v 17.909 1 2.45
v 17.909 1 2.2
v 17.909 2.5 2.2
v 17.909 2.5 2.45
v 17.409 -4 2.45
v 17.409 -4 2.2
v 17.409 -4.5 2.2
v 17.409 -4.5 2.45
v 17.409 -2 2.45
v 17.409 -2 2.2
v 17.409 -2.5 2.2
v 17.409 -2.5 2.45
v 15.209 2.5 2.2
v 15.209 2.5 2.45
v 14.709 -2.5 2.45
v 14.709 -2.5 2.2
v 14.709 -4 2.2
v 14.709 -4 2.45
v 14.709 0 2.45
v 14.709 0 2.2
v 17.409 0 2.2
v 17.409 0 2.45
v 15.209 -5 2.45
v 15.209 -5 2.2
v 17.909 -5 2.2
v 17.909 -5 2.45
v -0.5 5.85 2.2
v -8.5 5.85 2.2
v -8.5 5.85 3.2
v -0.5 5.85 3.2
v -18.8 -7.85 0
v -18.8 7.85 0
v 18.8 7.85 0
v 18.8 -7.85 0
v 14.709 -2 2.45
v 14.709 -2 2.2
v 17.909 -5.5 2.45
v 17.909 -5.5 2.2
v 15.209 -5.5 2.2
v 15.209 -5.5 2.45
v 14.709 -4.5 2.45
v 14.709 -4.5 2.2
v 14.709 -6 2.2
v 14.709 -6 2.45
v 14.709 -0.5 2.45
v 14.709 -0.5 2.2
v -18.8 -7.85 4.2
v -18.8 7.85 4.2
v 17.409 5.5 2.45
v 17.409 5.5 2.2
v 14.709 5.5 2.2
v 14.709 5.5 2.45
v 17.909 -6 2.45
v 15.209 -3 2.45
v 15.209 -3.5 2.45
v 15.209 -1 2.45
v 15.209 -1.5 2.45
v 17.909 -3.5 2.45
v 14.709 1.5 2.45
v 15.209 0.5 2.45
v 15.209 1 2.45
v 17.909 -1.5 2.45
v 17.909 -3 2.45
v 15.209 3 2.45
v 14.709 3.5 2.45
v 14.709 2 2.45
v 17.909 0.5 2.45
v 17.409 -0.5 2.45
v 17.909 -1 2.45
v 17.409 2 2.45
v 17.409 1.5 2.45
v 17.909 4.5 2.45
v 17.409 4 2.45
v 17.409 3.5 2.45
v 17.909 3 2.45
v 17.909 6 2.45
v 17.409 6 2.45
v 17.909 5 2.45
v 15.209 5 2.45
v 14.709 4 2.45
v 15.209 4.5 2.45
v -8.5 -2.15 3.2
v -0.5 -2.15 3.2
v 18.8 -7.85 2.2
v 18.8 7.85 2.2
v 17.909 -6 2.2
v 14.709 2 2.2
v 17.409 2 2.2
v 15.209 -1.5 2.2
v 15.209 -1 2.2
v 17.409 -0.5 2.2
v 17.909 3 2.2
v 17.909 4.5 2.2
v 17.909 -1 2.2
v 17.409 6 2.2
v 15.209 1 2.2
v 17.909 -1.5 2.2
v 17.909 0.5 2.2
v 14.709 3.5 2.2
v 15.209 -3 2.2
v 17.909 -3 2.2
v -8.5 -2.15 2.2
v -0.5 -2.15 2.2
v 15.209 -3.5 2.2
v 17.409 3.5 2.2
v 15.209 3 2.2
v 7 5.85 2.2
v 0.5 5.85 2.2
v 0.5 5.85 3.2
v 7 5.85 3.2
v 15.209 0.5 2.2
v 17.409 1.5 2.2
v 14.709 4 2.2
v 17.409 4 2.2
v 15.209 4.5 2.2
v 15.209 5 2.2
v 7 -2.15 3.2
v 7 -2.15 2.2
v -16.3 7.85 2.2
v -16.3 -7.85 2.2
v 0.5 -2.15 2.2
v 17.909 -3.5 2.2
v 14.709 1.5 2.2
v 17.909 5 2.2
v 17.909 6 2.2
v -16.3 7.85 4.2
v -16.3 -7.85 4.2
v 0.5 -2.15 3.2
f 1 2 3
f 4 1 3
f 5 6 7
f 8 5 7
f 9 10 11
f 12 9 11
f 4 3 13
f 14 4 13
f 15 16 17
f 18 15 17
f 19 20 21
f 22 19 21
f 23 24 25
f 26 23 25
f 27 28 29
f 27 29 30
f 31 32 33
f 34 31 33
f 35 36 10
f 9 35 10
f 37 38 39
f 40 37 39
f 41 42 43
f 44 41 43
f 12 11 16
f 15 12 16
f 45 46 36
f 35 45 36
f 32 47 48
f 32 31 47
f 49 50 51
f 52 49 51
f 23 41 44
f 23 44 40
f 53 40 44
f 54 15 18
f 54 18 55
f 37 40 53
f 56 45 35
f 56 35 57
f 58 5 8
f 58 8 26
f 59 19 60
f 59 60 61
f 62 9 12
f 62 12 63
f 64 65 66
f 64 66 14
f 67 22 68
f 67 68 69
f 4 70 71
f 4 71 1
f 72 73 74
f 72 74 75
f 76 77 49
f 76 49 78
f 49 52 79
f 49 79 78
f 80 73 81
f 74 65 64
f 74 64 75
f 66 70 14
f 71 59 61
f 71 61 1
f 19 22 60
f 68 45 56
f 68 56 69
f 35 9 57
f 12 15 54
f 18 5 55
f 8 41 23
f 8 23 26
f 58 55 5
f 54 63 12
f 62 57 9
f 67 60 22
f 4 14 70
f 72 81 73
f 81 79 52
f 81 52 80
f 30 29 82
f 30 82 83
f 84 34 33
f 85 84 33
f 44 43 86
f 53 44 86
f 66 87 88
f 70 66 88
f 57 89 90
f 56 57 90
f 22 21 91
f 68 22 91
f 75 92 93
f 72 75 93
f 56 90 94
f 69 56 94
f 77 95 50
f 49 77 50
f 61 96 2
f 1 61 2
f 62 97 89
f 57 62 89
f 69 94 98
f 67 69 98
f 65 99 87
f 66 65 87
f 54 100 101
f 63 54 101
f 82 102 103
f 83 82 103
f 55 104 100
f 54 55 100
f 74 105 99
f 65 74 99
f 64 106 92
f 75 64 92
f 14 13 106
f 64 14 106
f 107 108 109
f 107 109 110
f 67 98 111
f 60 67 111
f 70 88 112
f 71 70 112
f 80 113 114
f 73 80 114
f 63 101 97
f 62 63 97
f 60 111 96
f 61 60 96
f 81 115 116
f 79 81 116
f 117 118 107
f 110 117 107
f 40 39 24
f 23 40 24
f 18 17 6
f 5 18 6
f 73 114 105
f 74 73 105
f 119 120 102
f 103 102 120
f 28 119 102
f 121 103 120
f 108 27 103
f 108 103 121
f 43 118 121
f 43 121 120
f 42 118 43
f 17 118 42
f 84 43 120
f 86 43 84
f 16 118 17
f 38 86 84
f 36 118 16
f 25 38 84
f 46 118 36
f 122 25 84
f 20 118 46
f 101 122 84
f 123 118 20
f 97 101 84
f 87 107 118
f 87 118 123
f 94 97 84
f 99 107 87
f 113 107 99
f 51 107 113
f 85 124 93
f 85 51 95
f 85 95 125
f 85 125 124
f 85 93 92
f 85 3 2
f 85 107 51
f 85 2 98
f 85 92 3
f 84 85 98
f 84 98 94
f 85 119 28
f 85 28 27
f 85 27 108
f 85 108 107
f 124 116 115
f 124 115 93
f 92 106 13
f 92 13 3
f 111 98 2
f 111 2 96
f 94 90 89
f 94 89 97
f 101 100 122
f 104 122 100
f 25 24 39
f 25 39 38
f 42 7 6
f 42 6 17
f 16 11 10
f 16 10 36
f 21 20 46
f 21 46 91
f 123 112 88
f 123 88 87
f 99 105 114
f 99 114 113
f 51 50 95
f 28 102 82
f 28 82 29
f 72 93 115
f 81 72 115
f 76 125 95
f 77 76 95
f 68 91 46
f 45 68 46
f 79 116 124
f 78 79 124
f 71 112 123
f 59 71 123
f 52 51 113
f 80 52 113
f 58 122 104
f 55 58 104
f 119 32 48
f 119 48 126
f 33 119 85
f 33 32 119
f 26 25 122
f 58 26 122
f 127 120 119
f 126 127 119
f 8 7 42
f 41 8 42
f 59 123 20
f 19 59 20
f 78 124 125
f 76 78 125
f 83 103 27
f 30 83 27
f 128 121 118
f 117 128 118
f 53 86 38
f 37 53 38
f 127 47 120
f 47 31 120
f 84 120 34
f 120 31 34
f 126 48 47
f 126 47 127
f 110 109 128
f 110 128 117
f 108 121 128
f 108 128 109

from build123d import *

# Parameters (mm, degrees)
F0_W     = 37.6
F0_H     = 15.7
F1_DEPTH = 2.2
F3_DEPTH = 0.25
F4_W     = 2.5
F4_H     = 15.7
F5_DEPTH = 2
F6_W     = 8
F6_H     = 8
F6_W_2   = 6.5
F7_DEPTH = 1


with BuildPart() as f1:
    # F0 (on Top) → F1 (new body)
    with BuildSketch(Plane.XY):
        Rectangle(F0_W, F0_H)
    extrude(amount=F1_DEPTH)

    # F2 (on face) → F3 (join)
    with BuildSketch(Plane.XY.offset(2.2)):
        Polygon((17.908588, 6), (17.408588, 6), (17.408588, 5.5), (14.708588, 5.5), (14.708588, 4), (15.208588, 4), (17.408588, 4), (17.408588, 3.5), (14.708588, 3.5), (14.708588, 2), (17.408588, 2), (17.408588, 1.5), (14.708588, 1.5), (14.708588, 0), (17.408588, 0), (17.408588, -0.5), (14.708588, -0.5), (14.708588, -2), (17.408588, -2), (17.408588, -2.5), (14.708588, -2.5), (14.708588, -4), (17.408588, -4), (17.408588, -4.5), (14.708588, -4.5), (14.708588, -6), (17.908588, -6), (17.908588, -5.5), (15.208588, -5.5), (15.208588, -5), (17.908588, -5), (17.908588, -3.5), (15.208588, -3.5), (15.208588, -3), (17.908588, -3), (17.908588, -1.5), (15.208588, -1.5), (15.208588, -1), (17.908588, -1), (17.908588, 0.5), (15.208588, 0.5), (15.208588, 1), (17.908588, 1), (17.908588, 2.5), (15.208588, 2.5), (15.208588, 3), (17.908588, 3), (17.908588, 4.5), (15.208588, 4.5), (15.208588, 5), (17.908588, 5), align=None)
    extrude(amount=F3_DEPTH)

    # F4 (on face) → F5 (join)
    with BuildSketch(Plane.XY.offset(2.2)):
        with Locations((-17.55, 0)):
            Rectangle(F4_W, F4_H)
    extrude(amount=F5_DEPTH)

    # F6 (on face) → F7 (join)
    with BuildSketch(Plane.XY.offset(2.2)):
        with Locations((-4.5, 1.85)):
            Rectangle(F6_W, F6_H)
        with Locations((3.75, 1.85)):
            Rectangle(F6_W_2, F6_H)
    extrude(amount=F7_DEPTH)


solid = f1.part
